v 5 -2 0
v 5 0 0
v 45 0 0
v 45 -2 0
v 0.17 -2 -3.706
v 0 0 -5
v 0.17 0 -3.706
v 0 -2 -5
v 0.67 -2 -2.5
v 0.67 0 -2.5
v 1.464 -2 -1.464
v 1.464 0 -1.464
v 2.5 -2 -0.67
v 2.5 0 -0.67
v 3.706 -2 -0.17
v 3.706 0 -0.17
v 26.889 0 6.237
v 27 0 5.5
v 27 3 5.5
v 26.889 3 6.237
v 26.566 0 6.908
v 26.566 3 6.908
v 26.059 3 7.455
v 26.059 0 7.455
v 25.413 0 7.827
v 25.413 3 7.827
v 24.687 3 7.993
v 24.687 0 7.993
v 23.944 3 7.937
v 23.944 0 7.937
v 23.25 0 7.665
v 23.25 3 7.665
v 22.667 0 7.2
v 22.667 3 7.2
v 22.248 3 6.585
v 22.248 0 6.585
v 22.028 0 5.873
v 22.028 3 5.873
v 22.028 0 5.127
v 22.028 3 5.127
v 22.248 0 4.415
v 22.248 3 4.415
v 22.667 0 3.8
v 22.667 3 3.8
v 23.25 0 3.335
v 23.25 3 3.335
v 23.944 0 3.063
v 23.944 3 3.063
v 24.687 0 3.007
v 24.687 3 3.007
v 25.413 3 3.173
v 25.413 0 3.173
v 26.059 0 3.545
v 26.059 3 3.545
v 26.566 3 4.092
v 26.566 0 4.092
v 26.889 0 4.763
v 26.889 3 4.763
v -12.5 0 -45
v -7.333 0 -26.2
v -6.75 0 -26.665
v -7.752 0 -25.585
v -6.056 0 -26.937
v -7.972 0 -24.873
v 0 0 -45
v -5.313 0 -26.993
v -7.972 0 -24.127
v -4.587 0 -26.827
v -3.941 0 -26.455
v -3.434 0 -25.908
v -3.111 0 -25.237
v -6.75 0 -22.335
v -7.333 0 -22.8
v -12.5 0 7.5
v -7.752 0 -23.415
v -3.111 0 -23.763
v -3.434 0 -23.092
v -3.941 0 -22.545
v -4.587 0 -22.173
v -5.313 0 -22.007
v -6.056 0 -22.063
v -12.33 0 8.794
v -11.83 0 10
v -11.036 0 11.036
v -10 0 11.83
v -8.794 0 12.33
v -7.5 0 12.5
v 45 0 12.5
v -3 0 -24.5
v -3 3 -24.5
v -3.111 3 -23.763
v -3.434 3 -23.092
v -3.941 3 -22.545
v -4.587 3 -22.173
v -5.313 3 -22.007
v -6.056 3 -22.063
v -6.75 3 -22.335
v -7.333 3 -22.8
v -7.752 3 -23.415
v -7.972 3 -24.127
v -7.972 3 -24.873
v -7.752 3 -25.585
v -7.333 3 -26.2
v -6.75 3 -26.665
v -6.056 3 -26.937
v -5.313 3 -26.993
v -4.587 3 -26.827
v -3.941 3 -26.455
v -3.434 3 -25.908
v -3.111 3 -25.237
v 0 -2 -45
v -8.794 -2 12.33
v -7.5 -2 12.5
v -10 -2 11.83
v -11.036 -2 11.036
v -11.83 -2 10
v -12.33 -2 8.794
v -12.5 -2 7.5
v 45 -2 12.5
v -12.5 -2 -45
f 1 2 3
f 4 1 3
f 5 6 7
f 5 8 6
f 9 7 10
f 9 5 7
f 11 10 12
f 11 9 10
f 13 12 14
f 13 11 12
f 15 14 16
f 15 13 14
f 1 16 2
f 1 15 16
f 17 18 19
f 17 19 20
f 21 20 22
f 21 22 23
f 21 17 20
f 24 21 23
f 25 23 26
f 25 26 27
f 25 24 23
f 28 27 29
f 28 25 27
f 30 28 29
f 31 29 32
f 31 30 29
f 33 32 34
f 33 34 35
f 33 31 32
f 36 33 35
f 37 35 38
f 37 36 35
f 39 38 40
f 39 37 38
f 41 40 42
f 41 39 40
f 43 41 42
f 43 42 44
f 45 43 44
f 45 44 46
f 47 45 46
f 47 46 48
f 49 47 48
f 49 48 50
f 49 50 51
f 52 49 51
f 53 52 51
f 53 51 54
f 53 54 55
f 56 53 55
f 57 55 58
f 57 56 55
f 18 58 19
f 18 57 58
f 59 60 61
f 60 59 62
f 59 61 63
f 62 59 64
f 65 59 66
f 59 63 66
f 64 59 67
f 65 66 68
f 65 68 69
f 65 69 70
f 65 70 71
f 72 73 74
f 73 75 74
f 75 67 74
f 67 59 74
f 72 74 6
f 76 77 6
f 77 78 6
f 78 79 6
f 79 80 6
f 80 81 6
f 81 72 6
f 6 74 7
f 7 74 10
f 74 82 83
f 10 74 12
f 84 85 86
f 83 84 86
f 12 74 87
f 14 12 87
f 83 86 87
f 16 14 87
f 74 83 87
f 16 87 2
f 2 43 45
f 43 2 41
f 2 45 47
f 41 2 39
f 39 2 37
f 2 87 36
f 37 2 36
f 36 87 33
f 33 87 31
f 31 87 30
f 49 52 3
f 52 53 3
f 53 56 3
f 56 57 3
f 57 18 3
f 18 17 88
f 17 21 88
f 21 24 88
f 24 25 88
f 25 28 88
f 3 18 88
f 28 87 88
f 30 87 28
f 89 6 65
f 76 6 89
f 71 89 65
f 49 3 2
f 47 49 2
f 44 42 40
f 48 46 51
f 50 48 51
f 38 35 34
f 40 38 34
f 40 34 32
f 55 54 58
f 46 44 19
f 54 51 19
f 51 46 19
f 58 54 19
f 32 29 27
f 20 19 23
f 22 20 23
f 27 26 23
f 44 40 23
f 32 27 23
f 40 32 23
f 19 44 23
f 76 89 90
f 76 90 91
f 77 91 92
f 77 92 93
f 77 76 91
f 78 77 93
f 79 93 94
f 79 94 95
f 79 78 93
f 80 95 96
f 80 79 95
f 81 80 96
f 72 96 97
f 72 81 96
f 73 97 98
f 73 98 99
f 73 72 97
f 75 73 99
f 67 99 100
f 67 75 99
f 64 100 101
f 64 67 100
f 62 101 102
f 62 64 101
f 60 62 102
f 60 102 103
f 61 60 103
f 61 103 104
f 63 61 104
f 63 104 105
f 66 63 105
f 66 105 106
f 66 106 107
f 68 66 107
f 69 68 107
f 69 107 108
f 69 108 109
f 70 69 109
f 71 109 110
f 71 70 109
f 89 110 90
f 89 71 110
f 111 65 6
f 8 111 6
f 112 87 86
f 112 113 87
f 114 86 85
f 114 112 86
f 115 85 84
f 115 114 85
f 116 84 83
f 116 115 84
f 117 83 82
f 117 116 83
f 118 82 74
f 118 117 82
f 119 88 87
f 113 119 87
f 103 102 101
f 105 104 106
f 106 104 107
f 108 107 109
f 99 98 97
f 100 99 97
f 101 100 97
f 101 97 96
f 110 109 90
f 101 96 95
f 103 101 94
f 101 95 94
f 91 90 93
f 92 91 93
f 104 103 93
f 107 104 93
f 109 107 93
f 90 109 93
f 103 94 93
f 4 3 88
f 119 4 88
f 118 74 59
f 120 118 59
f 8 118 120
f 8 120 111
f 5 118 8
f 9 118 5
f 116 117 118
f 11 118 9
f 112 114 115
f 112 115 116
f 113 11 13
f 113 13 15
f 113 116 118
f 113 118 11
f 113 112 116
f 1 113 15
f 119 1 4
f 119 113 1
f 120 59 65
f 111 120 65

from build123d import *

# Parameters (mm, degrees)
F1_DEPTH = 2
F2_R     = 5
F3_R     = 2.5
F4_DEPTH = 3


with BuildPart() as f1:
    # F0 (on Front) → F1 (new body)
    with BuildSketch(Plane.XZ):
        Polygon((45, 12.5), (-12.5, 12.5), (-12.5, -45), (0, -45), (0, 0), (45, 0), align=None)
    extrude(amount=F1_DEPTH)

    # F2
    f2_edges = [f1.edges().sort_by_distance(p)[0] for p in [
        (-12.5, -1, 12.5),
        (0, -1, 0),
    ]]
    fillet(f2_edges, radius=F2_R)

    # F3 (on Front) → F4 (join)
    with BuildSketch(Plane.XZ):
        with Locations((24.5, 5.5)):
            Circle(F3_R)
        with Locations((-5.5, -24.5)):
            Circle(F3_R)
    extrude(amount=-F4_DEPTH)


solid = f1.part
